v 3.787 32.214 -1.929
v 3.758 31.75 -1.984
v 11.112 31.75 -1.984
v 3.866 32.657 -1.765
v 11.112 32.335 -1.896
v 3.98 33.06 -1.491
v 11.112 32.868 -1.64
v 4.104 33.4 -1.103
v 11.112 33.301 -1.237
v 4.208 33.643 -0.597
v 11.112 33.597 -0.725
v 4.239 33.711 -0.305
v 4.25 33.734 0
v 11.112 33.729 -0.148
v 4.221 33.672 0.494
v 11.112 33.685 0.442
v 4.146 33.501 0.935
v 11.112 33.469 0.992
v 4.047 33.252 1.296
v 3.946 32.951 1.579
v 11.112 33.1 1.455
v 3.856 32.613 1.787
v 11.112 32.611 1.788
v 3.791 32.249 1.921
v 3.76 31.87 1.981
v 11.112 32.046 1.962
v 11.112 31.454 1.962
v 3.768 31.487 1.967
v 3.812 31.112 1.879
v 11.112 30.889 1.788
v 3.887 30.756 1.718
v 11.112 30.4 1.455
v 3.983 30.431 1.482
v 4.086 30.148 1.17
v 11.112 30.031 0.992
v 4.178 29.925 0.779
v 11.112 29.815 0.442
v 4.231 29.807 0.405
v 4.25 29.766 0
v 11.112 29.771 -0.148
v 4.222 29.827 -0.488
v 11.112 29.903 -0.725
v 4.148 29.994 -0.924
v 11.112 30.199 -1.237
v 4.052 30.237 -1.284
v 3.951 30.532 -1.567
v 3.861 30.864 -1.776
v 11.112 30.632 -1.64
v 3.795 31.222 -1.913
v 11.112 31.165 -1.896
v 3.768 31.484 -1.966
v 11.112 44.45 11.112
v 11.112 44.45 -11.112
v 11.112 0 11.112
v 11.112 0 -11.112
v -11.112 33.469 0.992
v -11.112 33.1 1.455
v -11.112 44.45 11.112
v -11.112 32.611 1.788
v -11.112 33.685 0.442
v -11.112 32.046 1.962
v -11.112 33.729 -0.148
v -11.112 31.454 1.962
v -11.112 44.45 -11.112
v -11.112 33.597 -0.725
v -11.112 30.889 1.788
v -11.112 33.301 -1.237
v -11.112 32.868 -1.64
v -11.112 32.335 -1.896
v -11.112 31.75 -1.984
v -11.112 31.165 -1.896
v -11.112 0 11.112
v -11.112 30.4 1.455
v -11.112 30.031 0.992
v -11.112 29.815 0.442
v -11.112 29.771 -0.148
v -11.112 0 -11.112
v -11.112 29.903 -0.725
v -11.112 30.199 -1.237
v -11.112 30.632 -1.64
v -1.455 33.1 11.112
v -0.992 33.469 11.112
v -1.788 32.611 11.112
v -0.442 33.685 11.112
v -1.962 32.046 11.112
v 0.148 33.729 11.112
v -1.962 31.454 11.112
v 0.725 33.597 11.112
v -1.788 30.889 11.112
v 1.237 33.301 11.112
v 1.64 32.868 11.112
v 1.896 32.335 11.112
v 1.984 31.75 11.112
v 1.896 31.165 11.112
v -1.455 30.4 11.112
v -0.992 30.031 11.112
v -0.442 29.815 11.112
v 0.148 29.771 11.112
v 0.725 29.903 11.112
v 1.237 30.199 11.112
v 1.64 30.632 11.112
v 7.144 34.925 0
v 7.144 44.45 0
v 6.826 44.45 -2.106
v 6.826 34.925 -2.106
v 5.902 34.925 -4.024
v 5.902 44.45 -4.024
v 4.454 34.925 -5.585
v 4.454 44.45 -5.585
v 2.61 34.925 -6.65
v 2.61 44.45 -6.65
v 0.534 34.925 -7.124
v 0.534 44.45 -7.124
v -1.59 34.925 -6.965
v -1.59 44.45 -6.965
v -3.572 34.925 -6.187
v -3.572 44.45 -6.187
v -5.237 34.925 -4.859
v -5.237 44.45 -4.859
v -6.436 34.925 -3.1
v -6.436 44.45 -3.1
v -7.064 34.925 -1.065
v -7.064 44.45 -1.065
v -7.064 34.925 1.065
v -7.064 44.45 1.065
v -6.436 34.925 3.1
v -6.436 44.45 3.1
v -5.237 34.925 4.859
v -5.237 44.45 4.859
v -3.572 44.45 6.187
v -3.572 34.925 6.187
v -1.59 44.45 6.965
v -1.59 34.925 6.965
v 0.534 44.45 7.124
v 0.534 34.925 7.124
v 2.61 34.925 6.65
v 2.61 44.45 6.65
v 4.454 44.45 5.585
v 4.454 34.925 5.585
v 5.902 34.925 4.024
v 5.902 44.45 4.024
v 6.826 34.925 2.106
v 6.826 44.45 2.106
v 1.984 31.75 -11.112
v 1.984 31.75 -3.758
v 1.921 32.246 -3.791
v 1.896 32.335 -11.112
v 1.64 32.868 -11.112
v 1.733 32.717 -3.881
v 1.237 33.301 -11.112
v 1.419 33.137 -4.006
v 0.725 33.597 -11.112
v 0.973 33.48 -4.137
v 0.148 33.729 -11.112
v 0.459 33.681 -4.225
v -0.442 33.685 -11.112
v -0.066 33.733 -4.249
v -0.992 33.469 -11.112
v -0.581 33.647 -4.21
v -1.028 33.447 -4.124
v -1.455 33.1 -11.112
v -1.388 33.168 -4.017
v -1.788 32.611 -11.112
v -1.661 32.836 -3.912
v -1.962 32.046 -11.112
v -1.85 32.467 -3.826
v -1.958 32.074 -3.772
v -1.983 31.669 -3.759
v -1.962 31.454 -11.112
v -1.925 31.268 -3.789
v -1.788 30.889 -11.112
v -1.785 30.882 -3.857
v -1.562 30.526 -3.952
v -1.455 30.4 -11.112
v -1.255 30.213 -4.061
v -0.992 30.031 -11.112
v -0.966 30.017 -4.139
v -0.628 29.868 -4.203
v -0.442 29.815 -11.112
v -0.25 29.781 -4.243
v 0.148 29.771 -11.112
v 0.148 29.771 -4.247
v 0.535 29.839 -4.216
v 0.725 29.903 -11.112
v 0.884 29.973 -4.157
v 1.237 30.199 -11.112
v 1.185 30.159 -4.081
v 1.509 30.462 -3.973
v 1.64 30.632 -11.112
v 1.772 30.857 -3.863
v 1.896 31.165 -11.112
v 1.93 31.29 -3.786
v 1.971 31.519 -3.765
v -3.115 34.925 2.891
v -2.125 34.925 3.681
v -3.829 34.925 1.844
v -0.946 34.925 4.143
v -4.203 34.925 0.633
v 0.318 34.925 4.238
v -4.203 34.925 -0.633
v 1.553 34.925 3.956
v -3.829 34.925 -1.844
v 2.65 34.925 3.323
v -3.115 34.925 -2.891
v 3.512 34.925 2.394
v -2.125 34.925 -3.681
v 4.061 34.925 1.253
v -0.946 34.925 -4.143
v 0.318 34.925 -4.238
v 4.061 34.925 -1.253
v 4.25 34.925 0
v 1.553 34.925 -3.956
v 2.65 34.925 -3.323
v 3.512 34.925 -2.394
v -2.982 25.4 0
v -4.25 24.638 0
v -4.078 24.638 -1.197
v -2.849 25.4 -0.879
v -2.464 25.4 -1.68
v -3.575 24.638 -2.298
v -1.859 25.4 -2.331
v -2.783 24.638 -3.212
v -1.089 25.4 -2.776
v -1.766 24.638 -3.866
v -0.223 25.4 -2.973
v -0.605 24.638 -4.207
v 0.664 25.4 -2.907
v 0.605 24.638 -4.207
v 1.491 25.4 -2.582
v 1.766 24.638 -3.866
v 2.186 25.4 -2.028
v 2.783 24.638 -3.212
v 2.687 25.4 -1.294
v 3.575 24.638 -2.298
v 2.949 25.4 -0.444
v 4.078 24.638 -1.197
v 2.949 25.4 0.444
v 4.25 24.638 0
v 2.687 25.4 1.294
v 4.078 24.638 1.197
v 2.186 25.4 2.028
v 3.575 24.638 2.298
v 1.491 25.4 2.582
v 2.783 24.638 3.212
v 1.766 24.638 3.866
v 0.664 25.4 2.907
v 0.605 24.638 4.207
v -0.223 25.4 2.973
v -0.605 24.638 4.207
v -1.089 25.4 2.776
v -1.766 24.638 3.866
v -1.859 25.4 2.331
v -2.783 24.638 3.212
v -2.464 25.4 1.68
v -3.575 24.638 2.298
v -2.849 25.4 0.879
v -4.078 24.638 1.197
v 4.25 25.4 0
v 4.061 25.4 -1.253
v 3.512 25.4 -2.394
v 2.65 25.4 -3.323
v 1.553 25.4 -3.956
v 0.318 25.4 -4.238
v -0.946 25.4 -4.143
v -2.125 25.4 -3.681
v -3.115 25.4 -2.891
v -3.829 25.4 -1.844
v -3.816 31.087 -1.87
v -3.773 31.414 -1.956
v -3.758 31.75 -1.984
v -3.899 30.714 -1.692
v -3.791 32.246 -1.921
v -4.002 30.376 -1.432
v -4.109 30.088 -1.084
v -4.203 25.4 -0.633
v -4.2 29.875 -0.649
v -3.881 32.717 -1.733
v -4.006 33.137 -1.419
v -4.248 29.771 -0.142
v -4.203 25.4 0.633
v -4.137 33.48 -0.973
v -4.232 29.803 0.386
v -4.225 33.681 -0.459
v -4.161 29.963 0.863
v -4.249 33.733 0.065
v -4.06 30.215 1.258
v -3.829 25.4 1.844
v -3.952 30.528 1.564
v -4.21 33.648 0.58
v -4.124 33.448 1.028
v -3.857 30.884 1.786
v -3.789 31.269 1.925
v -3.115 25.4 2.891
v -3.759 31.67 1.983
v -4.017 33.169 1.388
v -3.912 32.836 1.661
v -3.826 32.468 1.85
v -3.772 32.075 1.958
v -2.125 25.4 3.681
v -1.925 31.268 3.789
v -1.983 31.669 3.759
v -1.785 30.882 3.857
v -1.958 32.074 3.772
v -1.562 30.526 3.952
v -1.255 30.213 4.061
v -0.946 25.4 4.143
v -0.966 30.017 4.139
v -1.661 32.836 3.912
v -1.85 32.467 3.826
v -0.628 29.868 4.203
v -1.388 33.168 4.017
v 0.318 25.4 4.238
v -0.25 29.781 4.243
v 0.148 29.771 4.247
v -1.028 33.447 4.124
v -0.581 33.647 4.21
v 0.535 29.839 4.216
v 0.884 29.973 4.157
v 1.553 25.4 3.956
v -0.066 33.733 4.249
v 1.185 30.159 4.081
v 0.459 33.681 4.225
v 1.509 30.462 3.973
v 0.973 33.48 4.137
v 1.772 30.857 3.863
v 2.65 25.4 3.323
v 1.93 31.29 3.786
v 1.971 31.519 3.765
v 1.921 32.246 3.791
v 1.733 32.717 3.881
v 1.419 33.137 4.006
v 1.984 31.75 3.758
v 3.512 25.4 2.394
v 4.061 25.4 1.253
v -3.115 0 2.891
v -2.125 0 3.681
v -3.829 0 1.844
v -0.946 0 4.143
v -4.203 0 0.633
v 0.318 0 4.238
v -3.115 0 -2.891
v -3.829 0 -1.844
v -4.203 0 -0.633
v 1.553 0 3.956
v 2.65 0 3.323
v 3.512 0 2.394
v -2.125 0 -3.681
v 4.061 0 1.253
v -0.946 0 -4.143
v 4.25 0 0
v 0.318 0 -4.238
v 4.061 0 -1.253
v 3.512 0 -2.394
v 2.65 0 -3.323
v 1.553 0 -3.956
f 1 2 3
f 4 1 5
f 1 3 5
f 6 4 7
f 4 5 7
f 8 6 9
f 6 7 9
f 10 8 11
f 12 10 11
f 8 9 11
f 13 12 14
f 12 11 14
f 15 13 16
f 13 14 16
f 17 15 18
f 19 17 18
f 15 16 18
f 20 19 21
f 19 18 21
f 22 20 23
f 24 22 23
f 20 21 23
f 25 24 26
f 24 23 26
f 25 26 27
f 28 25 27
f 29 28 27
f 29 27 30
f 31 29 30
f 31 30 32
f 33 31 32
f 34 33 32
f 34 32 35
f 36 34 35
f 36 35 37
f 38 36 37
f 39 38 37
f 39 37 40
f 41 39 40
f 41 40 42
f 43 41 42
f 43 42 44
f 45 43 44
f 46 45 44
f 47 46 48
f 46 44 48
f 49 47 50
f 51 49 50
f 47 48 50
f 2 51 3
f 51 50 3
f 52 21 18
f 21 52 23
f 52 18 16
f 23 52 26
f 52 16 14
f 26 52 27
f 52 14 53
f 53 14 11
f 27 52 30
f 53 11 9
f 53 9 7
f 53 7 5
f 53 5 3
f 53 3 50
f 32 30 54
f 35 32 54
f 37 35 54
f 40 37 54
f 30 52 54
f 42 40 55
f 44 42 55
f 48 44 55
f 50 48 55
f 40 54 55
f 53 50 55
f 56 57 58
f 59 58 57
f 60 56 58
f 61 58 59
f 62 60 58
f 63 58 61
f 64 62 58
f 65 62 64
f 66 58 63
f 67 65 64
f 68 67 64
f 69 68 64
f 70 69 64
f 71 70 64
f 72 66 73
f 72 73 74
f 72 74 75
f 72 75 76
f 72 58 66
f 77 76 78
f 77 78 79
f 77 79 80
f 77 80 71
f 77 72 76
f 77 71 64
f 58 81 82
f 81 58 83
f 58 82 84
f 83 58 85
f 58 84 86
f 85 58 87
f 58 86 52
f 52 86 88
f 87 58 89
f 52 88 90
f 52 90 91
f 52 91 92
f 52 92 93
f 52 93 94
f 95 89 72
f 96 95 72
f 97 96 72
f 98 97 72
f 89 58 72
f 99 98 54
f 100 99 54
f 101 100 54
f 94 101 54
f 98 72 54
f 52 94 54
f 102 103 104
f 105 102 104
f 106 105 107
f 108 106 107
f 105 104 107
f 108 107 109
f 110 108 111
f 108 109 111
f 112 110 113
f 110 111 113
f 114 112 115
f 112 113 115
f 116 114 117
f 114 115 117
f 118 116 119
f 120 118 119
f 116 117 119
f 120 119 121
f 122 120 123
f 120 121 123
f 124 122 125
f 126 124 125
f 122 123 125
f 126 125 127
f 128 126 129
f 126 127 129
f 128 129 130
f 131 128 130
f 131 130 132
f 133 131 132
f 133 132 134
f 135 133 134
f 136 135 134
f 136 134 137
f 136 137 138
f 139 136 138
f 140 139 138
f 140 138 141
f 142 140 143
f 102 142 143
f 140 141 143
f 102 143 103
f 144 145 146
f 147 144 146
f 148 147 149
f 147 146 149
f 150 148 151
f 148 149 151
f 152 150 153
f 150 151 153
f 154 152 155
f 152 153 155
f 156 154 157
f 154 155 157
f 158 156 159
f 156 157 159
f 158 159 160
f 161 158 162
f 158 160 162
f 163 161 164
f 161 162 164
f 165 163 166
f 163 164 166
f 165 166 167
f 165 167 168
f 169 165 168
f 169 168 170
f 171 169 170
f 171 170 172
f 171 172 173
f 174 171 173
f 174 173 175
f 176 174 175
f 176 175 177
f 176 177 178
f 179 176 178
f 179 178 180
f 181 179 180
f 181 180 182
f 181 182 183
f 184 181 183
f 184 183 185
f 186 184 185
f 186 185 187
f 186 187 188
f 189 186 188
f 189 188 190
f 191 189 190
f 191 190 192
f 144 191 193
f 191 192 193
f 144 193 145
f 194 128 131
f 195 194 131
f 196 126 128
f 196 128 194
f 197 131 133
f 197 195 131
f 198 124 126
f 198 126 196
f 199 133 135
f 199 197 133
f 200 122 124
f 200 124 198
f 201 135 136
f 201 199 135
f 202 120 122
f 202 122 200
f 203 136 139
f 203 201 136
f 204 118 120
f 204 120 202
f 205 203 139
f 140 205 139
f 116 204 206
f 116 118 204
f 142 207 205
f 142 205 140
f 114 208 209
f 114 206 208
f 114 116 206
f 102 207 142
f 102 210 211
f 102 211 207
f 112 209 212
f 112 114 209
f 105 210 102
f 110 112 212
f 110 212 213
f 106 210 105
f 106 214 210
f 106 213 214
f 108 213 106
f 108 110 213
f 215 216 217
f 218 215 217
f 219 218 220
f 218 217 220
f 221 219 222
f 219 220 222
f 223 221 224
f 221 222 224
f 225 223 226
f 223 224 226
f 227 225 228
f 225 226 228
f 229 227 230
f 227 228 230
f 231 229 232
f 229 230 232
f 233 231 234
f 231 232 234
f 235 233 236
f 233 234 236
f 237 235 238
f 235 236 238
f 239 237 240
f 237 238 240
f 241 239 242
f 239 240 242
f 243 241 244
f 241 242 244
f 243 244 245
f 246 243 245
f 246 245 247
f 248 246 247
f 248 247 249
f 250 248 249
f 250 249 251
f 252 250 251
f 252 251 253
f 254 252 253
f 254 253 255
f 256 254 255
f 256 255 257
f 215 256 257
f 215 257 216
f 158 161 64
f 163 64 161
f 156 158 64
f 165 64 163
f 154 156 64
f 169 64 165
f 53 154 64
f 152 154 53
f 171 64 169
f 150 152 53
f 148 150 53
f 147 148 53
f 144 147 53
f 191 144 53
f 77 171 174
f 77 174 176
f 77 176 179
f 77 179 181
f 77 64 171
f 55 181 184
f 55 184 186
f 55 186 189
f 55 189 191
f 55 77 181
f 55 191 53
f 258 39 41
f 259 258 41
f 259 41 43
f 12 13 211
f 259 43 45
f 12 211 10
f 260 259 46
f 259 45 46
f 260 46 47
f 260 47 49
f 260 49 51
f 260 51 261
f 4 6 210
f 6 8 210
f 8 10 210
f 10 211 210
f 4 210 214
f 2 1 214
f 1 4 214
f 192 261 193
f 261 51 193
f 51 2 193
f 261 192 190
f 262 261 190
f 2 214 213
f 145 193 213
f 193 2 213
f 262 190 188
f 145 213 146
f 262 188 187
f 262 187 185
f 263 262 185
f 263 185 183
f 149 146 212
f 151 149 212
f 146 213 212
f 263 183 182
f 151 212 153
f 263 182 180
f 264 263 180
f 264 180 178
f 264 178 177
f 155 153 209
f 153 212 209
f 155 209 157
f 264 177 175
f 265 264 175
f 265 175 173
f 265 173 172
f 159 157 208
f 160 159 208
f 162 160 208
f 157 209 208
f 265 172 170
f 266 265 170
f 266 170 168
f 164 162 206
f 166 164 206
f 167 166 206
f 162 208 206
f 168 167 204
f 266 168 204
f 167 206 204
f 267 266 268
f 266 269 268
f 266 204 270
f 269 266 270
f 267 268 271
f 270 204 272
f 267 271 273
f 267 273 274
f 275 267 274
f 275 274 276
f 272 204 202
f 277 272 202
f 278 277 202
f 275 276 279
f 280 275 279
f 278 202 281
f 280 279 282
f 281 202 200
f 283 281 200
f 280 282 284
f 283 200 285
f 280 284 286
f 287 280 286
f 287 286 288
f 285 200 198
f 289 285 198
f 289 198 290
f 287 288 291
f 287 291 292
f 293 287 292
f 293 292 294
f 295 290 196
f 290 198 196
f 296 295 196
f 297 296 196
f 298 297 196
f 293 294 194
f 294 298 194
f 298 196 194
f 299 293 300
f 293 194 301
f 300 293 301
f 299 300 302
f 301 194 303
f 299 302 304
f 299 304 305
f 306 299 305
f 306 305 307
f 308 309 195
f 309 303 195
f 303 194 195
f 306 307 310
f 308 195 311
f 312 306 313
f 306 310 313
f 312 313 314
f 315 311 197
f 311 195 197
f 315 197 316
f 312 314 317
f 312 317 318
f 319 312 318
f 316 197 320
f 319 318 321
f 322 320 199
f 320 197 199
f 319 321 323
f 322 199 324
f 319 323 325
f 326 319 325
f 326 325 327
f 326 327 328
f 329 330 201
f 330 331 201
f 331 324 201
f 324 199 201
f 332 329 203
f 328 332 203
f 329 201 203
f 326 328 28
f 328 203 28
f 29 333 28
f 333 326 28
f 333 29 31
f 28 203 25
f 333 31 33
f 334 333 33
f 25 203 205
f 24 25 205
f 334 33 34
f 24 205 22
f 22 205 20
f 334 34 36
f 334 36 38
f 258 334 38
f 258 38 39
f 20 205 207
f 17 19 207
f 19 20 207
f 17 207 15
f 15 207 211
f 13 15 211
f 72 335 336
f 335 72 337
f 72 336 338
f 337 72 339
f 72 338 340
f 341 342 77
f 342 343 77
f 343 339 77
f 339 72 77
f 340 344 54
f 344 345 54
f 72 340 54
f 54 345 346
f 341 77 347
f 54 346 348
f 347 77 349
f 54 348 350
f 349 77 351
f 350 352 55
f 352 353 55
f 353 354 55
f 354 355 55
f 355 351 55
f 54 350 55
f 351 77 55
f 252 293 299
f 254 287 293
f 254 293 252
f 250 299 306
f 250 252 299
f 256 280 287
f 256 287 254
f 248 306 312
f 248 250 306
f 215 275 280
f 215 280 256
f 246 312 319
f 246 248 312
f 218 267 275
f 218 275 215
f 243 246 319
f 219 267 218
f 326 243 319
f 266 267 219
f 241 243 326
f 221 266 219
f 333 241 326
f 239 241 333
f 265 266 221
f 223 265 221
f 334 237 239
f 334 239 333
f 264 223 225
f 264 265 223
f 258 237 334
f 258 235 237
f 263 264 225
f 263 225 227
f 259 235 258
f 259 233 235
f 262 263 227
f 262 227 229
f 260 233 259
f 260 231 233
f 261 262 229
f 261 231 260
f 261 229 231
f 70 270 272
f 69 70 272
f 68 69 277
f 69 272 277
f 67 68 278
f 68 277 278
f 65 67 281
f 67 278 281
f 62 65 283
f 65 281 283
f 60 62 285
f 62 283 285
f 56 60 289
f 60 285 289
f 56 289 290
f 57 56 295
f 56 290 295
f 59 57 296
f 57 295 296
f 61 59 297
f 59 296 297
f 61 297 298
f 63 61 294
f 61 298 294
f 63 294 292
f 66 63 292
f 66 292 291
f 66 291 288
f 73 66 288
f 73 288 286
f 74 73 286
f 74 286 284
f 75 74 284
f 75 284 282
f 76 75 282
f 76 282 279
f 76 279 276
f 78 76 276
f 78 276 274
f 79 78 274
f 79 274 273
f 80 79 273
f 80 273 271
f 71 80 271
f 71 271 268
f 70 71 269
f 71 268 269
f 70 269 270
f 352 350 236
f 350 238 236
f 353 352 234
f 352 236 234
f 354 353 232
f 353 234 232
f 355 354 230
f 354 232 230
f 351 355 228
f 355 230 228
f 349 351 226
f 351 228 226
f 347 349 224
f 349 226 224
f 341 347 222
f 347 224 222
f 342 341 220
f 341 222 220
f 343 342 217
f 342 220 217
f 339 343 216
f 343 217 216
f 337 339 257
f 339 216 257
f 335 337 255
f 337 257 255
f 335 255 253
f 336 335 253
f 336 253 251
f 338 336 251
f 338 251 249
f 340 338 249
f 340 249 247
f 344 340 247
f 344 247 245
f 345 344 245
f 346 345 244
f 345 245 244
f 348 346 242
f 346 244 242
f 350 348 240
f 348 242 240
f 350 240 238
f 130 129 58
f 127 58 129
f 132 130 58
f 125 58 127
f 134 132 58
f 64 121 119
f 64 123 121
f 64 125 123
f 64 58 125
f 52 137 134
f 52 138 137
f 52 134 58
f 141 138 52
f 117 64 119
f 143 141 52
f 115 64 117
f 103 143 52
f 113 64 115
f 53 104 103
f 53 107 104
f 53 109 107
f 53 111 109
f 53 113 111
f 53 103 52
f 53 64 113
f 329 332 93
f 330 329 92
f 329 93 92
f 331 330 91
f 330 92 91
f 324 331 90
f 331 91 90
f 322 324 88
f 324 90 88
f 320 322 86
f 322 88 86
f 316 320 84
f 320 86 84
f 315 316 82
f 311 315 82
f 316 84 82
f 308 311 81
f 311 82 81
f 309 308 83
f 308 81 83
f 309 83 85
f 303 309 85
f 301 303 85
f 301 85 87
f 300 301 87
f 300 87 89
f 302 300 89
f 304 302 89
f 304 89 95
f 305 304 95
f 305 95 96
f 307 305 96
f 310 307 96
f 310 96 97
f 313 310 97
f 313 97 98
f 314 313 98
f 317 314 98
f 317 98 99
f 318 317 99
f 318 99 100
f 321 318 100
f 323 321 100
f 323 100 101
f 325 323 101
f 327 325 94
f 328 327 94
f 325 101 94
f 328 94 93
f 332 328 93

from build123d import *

# Parameters (mm, degrees)
SKETCH1_W                  = 22.225
SKETCH1_H                  = 22.225
BOSS_EXTRUDE1_DEPTH        = 44.45
M10X1_5_TAPPED_HOLE1_D     = 8.5
M10X1_5_TAPPED_HOLE1_DEPTH = 24.638
M10X1_5_TAPPED_HOLE1_TIP   = 2.553657631
SKETCH9_R                  = 4.25
CUT_EXTRUDE1_DEPTH         = 19.05
SKETCH10_R                 = 7.14375
CUT_EXTRUDE2_DEPTH         = 9.525
SKETCH11_R                 = 1.984375
CUT_EXTRUDE3_DEPTH         = 23.225
SKETCH12_R                 = 1.984375
CUT_EXTRUDE4_DEPTH         = 23.225


with BuildPart() as part:
    # Sketch1 → Boss-Extrude1 (new body)
    with BuildSketch(Plane(origin=(0, 0, 0), x_dir=(1, 0, 0), z_dir=(0, 1, 0))):
        Rectangle(SKETCH1_W, SKETCH1_H)
    extrude(amount=BOSS_EXTRUDE1_DEPTH)

    # M10x1.5 Tapped Hole1
    with Locations(Plane(origin=(0, 0, 0), x_dir=(-1, 0, 0), z_dir=(0, -1, 0))):
        with Locations((0, 0)):
            Hole(M10X1_5_TAPPED_HOLE1_D / 2, depth=M10X1_5_TAPPED_HOLE1_DEPTH)
            with Locations((0, 0, -(M10X1_5_TAPPED_HOLE1_DEPTH + M10X1_5_TAPPED_HOLE1_TIP / 2))):  # 118° drill point
                Cone(0, M10X1_5_TAPPED_HOLE1_D / 2, M10X1_5_TAPPED_HOLE1_TIP, mode=Mode.SUBTRACT)

    # Sketch9 → Cut-Extrude1 (cut)
    with BuildSketch(Plane(origin=(0, 44.45, 0), x_dir=(1, 0, 0), z_dir=(0, 1, 0))):
        Circle(SKETCH9_R)
    extrude(amount=-CUT_EXTRUDE1_DEPTH, mode=Mode.SUBTRACT)

    # Sketch10 → Cut-Extrude2 (cut)
    with BuildSketch(Plane(origin=(0, 44.45, 0), x_dir=(1, 0, 0), z_dir=(0, 1, 0))):
        Circle(SKETCH10_R)
    extrude(amount=-CUT_EXTRUDE2_DEPTH, mode=Mode.SUBTRACT)

    # Sketch11 → Cut-Extrude3 (cut, through all)
    with BuildSketch(Plane(origin=(11.1125, 0, 0), x_dir=(0, 0, -1), z_dir=(1, 0, 0))):
        with Locations((0, 31.75)):
            Circle(SKETCH11_R)
    extrude(amount=-CUT_EXTRUDE3_DEPTH, mode=Mode.SUBTRACT)

    # Sketch12 → Cut-Extrude4 (cut, through all)
    with BuildSketch(Plane.XY.offset(11.1125)):
        with Locations((0, 31.75)):
            Circle(SKETCH12_R)
    extrude(amount=-CUT_EXTRUDE4_DEPTH, mode=Mode.SUBTRACT)


solid = part.part
